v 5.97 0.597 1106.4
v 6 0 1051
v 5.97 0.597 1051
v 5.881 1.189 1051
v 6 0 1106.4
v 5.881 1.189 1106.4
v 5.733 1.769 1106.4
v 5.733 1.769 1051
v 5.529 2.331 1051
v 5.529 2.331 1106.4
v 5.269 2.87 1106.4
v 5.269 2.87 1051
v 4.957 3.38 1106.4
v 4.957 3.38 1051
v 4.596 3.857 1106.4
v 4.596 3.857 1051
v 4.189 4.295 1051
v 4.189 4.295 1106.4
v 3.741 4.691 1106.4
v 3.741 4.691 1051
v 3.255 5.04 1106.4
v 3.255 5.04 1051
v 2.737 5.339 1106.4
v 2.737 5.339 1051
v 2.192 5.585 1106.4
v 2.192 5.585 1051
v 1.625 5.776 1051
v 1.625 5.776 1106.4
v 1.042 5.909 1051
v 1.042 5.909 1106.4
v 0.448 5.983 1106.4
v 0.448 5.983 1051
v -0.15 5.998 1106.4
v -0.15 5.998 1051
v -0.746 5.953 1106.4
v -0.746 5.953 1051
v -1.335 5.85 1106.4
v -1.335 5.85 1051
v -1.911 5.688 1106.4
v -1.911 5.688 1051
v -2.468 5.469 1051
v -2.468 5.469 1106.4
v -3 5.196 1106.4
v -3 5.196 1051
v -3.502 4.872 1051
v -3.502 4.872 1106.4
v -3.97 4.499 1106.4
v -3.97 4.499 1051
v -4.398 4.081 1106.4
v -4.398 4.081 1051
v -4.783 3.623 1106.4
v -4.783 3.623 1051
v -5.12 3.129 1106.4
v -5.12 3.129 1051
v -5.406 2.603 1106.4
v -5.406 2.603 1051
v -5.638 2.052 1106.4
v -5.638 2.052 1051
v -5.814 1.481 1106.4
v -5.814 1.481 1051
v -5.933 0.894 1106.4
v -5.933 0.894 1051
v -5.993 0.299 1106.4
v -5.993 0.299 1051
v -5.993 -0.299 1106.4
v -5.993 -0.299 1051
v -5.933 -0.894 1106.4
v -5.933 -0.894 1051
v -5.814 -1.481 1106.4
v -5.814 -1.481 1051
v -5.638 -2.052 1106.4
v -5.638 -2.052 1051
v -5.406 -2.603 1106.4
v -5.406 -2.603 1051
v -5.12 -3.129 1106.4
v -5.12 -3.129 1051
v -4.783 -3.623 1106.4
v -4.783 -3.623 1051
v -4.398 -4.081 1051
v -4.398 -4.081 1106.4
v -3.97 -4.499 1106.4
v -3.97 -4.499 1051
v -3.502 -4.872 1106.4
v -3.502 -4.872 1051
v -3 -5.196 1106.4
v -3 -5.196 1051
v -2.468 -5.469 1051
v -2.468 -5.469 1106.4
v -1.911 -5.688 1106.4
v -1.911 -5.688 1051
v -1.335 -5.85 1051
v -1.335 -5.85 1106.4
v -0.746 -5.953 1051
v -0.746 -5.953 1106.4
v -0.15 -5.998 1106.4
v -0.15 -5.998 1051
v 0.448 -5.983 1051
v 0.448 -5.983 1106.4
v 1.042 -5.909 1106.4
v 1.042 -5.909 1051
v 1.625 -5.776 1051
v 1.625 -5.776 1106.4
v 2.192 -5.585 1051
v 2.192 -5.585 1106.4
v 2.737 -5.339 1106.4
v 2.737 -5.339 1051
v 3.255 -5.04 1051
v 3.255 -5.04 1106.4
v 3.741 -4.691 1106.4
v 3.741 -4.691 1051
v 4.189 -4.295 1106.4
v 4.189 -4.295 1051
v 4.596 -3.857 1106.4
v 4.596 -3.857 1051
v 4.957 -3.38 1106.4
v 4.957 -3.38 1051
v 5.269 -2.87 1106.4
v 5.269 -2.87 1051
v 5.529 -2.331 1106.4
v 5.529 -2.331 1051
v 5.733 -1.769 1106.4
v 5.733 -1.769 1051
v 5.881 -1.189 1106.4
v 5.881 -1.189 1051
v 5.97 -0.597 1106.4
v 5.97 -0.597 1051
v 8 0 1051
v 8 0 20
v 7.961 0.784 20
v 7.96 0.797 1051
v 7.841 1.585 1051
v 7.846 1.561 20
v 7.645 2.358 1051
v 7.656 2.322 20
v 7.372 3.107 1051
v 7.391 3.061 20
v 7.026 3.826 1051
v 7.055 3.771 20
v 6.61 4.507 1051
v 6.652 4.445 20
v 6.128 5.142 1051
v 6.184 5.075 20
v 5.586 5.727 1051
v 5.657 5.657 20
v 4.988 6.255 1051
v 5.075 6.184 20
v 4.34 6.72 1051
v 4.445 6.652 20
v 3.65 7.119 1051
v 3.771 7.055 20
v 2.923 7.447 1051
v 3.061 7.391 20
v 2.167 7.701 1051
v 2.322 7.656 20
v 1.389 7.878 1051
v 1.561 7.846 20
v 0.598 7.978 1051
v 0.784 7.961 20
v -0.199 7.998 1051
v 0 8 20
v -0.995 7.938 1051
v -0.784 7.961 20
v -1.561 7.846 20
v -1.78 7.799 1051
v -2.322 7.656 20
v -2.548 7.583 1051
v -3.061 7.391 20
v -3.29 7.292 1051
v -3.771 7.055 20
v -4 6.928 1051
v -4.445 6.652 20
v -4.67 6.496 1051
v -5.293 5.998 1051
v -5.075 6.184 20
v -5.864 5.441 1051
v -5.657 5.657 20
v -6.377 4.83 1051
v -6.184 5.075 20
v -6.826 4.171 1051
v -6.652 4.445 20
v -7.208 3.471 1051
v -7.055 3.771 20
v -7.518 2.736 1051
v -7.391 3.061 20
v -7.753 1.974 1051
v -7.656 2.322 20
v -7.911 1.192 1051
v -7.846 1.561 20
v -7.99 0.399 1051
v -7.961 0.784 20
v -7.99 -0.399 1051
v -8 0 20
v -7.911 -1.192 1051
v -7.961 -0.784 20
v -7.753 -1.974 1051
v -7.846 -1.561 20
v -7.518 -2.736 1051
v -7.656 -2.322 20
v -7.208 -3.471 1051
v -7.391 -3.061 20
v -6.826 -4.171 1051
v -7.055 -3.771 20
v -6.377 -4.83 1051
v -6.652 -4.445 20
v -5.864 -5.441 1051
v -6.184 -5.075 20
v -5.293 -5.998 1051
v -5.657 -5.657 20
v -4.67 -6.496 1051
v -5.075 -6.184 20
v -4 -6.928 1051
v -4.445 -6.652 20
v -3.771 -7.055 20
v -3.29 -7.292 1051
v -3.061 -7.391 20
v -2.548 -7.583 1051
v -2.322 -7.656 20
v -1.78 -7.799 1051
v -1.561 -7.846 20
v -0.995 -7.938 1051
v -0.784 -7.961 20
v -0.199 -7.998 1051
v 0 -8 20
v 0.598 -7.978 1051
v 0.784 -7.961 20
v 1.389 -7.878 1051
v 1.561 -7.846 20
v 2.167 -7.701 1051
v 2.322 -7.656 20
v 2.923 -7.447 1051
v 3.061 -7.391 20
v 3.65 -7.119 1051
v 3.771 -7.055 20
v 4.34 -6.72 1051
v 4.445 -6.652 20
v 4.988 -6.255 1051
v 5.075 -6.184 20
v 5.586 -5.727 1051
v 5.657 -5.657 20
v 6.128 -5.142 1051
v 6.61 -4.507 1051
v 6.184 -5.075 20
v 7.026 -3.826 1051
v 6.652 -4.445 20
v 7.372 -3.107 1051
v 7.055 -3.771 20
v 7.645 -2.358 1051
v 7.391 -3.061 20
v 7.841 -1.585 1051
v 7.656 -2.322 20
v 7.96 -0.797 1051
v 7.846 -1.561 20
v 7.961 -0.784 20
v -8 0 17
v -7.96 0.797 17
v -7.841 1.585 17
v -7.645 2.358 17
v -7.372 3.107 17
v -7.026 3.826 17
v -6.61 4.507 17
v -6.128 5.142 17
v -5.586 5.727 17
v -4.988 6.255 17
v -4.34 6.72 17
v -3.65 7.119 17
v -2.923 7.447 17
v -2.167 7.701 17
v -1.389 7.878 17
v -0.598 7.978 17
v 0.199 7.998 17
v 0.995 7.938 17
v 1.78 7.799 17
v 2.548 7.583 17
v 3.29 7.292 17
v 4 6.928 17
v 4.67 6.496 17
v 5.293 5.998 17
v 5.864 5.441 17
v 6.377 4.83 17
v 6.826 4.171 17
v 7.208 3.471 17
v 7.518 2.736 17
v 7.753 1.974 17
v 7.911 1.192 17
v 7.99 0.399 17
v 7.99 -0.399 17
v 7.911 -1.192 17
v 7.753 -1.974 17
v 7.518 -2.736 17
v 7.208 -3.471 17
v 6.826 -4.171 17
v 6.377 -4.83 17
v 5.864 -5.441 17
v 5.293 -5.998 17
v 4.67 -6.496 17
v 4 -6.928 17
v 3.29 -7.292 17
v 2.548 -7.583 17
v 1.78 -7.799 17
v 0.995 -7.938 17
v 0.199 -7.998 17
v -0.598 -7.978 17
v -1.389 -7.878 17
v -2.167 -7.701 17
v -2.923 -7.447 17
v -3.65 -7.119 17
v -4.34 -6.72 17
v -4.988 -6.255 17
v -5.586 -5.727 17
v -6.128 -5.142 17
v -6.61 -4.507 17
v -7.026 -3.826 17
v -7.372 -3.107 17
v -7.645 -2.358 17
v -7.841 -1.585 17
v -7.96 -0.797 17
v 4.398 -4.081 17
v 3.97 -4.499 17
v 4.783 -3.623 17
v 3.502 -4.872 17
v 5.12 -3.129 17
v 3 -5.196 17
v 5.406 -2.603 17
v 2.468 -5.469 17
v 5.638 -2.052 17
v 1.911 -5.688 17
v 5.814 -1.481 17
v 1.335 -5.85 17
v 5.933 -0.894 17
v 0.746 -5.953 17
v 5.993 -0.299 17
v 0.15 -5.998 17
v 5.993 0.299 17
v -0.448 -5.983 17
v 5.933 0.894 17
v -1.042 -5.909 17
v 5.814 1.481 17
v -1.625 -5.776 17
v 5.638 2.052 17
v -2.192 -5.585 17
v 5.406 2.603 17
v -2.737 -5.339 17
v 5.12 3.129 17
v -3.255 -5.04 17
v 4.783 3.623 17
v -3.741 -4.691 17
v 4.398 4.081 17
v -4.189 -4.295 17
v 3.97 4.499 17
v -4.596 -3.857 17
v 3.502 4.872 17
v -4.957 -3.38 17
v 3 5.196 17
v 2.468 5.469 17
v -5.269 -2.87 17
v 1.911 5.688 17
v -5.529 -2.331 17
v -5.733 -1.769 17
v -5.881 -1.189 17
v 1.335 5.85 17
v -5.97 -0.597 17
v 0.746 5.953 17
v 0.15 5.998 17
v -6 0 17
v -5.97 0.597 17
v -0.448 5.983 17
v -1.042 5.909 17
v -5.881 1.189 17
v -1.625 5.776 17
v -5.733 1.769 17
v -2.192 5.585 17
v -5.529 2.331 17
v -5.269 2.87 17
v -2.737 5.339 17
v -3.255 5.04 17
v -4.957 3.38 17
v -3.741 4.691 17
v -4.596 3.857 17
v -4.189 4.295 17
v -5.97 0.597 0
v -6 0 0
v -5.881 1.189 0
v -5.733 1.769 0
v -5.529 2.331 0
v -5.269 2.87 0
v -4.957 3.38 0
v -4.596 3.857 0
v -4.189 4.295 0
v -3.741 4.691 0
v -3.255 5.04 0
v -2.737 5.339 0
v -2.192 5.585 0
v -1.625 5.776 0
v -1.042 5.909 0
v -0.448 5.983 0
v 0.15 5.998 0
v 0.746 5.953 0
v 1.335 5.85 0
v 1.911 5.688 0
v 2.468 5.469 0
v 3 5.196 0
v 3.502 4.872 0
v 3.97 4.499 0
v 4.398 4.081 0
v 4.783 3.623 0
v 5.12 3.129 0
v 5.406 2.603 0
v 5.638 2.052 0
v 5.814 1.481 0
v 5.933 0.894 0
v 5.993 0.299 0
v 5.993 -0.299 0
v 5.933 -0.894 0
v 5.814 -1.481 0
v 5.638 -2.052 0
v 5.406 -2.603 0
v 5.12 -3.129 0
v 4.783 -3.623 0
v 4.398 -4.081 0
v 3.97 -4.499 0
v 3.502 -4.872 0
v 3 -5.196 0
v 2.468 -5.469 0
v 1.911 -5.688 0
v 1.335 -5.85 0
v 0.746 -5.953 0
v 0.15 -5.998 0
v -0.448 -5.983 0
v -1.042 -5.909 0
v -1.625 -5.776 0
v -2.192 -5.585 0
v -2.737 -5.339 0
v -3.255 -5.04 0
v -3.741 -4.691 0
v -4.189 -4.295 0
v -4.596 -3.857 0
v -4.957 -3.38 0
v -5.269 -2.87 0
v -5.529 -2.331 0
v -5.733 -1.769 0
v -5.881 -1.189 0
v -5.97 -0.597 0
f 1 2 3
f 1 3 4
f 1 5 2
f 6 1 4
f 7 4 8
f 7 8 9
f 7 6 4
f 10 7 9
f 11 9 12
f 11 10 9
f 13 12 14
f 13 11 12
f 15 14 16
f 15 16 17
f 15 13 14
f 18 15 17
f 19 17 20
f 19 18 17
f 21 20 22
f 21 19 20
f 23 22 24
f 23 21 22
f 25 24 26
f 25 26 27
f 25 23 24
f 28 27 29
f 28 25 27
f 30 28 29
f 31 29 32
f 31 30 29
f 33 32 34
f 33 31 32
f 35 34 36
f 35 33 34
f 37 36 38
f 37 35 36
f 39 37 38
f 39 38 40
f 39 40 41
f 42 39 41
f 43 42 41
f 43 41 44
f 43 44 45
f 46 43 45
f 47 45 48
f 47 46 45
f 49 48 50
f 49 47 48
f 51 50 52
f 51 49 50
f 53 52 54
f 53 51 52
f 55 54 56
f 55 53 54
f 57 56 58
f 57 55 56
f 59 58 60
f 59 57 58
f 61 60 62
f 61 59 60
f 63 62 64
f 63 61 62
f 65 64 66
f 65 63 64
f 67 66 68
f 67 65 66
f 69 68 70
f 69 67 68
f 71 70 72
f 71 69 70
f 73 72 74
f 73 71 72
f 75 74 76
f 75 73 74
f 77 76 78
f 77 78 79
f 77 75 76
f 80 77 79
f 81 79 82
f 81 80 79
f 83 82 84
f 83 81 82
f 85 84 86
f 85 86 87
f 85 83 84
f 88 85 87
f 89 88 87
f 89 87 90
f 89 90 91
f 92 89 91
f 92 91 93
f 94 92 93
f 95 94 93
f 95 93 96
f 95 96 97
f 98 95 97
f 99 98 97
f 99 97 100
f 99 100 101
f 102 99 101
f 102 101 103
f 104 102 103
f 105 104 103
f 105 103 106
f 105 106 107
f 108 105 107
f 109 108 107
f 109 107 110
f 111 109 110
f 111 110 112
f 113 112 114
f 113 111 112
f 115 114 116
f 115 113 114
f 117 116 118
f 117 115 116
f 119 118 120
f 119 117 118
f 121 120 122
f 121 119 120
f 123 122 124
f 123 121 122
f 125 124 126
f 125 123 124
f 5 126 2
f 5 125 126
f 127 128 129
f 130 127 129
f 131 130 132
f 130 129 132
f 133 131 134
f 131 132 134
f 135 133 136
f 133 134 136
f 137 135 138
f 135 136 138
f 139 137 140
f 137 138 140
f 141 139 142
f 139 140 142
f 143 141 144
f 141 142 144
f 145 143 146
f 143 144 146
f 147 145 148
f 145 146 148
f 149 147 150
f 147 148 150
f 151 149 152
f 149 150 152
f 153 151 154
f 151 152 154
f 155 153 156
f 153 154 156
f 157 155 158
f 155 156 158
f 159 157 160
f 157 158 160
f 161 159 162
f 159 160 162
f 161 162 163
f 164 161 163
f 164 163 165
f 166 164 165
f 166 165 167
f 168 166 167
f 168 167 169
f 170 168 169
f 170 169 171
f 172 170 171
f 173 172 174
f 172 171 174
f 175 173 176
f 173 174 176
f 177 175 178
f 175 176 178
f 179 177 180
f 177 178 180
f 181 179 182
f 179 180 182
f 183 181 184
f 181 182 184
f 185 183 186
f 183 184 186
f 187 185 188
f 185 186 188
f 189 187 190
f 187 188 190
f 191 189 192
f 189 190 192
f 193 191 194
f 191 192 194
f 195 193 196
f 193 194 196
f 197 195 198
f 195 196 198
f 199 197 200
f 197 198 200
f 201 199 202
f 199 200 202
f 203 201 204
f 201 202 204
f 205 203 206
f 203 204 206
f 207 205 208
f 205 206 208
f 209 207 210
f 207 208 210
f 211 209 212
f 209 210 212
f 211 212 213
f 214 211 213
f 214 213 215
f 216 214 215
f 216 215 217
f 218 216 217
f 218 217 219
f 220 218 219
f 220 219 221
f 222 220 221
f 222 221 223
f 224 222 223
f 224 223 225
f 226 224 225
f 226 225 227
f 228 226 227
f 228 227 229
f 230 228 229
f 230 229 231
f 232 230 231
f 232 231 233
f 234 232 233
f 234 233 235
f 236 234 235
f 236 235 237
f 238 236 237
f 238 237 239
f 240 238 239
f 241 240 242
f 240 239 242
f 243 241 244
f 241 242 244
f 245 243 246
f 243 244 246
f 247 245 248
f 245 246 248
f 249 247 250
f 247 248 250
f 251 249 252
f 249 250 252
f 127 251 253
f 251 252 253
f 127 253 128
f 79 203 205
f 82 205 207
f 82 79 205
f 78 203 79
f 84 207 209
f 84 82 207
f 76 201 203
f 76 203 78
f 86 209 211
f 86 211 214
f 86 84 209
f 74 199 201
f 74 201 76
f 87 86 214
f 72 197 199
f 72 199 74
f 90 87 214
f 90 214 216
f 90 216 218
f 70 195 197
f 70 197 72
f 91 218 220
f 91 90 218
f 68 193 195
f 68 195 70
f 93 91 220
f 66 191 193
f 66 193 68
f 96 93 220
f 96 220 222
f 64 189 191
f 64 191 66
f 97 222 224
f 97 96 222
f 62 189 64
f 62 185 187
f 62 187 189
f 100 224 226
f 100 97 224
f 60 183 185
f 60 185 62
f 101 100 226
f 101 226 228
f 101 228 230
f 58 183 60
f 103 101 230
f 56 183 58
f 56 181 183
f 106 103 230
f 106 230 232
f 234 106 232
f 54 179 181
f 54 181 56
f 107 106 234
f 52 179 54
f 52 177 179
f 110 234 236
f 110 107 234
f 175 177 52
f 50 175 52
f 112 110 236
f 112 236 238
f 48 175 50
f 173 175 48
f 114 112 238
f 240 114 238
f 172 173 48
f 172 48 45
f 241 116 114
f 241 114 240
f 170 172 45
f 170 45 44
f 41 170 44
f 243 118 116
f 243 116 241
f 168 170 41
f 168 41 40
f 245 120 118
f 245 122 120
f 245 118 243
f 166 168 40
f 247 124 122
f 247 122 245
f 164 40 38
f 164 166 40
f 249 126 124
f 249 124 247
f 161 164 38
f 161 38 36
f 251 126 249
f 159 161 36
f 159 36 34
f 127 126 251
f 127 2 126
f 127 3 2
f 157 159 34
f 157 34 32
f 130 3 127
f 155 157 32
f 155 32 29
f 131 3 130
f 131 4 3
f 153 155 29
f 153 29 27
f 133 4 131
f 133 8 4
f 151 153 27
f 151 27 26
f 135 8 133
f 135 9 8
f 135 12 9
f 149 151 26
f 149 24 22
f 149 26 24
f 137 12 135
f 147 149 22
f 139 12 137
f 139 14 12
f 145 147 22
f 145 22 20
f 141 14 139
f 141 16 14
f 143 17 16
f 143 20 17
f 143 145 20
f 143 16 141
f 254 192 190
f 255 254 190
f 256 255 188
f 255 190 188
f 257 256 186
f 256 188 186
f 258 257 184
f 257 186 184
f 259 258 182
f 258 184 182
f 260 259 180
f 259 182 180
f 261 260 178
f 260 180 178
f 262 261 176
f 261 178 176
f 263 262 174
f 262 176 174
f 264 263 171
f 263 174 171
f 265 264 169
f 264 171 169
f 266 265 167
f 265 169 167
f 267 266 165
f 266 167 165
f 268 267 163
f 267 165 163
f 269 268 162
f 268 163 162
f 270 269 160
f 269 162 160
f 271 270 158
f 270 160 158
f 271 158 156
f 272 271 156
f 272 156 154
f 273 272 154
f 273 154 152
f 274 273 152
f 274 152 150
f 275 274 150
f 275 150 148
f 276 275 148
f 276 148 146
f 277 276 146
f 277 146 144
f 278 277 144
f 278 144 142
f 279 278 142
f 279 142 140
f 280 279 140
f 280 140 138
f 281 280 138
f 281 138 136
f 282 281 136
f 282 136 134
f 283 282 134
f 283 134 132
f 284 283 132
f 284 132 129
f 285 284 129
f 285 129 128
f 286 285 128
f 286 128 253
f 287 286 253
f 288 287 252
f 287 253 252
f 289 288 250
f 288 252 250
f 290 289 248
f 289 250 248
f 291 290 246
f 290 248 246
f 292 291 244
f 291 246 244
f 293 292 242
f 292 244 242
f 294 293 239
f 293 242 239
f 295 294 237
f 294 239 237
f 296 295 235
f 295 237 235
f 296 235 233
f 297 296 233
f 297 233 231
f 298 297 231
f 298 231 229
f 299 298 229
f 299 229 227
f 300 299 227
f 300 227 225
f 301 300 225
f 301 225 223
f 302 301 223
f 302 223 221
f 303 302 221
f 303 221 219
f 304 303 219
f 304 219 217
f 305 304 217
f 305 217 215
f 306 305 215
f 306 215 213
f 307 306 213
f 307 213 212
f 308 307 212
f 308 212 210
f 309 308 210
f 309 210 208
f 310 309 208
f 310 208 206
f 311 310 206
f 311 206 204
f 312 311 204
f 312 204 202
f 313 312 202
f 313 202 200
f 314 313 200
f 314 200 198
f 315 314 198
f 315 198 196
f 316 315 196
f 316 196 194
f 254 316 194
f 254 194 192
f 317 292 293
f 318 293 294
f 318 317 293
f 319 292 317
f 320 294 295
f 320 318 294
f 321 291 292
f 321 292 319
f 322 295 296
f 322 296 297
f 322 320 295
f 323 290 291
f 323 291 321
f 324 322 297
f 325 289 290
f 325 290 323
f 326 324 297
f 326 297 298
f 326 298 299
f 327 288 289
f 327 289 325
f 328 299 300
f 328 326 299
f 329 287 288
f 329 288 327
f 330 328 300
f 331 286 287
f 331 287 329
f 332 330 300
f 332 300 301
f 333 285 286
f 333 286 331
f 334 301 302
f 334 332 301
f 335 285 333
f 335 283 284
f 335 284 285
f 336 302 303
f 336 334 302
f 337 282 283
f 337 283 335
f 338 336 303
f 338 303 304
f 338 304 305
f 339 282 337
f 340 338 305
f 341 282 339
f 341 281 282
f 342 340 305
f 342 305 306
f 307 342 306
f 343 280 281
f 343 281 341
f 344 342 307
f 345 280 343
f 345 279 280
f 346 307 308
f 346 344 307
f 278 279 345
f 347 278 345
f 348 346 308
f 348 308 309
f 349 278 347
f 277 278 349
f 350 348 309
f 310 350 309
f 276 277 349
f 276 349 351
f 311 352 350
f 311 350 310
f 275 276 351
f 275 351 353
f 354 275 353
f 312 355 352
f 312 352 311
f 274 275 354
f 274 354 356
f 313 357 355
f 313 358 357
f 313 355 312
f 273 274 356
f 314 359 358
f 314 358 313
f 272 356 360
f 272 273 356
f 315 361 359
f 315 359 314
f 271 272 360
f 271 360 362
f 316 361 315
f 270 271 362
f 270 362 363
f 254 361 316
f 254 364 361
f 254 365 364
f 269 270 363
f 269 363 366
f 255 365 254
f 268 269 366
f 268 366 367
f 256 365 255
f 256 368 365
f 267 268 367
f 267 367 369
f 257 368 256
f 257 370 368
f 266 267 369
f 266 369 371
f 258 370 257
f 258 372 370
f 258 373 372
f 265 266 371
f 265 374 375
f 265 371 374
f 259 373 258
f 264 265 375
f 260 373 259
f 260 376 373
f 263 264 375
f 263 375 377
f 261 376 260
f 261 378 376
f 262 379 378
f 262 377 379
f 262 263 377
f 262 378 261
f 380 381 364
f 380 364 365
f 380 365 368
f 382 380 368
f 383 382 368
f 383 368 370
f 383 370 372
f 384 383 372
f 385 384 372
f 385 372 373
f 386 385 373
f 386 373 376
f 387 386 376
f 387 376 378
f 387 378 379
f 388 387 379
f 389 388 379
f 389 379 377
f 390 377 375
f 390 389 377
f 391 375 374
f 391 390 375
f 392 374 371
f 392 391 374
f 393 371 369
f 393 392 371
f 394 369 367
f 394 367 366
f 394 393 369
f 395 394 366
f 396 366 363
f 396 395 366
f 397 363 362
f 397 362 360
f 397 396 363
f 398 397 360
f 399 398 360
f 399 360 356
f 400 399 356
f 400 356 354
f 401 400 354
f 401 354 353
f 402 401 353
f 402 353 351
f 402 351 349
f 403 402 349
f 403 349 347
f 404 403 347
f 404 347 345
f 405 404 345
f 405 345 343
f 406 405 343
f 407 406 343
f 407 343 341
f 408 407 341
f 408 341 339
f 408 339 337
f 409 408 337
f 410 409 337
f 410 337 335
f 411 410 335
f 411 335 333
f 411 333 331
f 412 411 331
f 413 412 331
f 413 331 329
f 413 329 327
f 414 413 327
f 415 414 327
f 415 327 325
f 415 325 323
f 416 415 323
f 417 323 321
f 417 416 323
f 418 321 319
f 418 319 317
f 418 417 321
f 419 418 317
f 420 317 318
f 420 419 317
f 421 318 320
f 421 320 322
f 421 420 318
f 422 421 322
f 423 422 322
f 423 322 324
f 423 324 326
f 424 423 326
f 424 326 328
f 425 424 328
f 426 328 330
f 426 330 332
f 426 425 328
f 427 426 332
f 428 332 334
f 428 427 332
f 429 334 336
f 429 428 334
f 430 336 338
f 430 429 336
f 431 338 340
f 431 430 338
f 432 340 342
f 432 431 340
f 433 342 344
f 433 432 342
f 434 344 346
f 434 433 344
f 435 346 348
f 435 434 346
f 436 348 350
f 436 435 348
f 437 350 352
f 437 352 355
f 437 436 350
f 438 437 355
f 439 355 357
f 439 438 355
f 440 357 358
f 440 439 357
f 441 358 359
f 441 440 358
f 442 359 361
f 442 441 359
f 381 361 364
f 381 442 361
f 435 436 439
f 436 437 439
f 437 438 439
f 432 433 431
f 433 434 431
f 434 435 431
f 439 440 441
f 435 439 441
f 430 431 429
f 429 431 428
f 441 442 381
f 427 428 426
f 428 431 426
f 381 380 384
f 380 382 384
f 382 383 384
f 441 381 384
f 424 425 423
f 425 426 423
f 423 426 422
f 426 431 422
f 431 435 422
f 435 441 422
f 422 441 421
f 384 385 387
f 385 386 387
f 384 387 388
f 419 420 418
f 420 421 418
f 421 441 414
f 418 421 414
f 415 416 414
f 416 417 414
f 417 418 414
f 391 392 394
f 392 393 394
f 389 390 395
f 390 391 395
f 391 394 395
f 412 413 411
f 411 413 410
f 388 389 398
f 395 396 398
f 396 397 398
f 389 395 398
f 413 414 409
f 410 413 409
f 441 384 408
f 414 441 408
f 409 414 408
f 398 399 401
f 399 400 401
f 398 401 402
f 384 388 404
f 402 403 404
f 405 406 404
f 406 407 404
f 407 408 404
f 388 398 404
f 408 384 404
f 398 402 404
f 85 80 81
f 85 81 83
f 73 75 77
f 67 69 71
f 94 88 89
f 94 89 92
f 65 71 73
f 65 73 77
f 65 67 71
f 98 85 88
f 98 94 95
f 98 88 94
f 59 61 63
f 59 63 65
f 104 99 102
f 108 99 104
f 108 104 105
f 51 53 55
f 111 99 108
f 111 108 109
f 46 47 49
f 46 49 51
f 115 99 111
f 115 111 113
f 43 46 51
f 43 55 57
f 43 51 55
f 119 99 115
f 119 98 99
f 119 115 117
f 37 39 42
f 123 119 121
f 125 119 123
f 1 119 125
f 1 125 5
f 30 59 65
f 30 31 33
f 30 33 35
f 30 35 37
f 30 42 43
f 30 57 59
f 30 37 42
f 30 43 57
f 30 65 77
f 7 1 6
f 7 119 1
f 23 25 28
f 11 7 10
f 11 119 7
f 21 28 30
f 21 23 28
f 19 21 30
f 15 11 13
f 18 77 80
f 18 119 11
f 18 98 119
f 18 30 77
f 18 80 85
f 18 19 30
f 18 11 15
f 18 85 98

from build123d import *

# Parameters (mm, degrees)
SKETCH1_R          = 8
EXTRUDE1_DEPTH     = 1102
SKETCH3_R          = 8
SKETCH3_R_2        = 6
CUT_EXTRUDE1_DEPTH = 54
SKETCH4_R          = 8
SKETCH4_R_2        = 6
CUT_EXTRUDE2_DEPTH = 20
SKETCH5_R          = 6
EXTRUDE2_DEPTH     = 4.4
SKETCH6_R          = 8
SKETCH6_R_2        = 6
EXTRUDE3_DEPTH     = 3
SKETCH7_R          = 8
SKETCH7_R_2        = 6
EXTRUDE4_DEPTH     = 3


with BuildPart() as part:
    # Sketch1 → Extrude1 (new body)
    with BuildSketch(Plane.XY):
        Circle(SKETCH1_R)
    extrude(amount=EXTRUDE1_DEPTH)

    # Sketch3 → Cut-Extrude1 (cut)
    with BuildSketch(Plane.XY.offset(1102)):
        Circle(SKETCH3_R)
        Circle(SKETCH3_R_2, mode=Mode.SUBTRACT)
    extrude(amount=-CUT_EXTRUDE1_DEPTH, mode=Mode.SUBTRACT)

    # Sketch4 → Cut-Extrude2 (cut)
    with BuildSketch(Plane(origin=(0, 0, 0), x_dir=(-1, 0, 0), z_dir=(0, 0, -1))):
        Circle(SKETCH4_R)
        Circle(SKETCH4_R_2, mode=Mode.SUBTRACT)
    extrude(amount=-CUT_EXTRUDE2_DEPTH, mode=Mode.SUBTRACT)

    # Sketch5 → Extrude2 (add)
    with BuildSketch(Plane.XY.offset(1102)):
        Circle(SKETCH5_R)
    extrude(amount=EXTRUDE2_DEPTH)

    # Sketch6 → Extrude3 (add)
    with BuildSketch(Plane.XY.offset(1048)):
        Circle(SKETCH6_R)
        Circle(SKETCH6_R_2, mode=Mode.SUBTRACT)
    extrude(amount=EXTRUDE3_DEPTH)

    # Sketch7 → Extrude4 (add)
    with BuildSketch(Plane(origin=(0, 0, 20), x_dir=(-1, 0, 0), z_dir=(0, 0, -1))):
        Circle(SKETCH7_R)
        Circle(SKETCH7_R_2, mode=Mode.SUBTRACT)
    extrude(amount=EXTRUDE4_DEPTH)


solid = part.part
